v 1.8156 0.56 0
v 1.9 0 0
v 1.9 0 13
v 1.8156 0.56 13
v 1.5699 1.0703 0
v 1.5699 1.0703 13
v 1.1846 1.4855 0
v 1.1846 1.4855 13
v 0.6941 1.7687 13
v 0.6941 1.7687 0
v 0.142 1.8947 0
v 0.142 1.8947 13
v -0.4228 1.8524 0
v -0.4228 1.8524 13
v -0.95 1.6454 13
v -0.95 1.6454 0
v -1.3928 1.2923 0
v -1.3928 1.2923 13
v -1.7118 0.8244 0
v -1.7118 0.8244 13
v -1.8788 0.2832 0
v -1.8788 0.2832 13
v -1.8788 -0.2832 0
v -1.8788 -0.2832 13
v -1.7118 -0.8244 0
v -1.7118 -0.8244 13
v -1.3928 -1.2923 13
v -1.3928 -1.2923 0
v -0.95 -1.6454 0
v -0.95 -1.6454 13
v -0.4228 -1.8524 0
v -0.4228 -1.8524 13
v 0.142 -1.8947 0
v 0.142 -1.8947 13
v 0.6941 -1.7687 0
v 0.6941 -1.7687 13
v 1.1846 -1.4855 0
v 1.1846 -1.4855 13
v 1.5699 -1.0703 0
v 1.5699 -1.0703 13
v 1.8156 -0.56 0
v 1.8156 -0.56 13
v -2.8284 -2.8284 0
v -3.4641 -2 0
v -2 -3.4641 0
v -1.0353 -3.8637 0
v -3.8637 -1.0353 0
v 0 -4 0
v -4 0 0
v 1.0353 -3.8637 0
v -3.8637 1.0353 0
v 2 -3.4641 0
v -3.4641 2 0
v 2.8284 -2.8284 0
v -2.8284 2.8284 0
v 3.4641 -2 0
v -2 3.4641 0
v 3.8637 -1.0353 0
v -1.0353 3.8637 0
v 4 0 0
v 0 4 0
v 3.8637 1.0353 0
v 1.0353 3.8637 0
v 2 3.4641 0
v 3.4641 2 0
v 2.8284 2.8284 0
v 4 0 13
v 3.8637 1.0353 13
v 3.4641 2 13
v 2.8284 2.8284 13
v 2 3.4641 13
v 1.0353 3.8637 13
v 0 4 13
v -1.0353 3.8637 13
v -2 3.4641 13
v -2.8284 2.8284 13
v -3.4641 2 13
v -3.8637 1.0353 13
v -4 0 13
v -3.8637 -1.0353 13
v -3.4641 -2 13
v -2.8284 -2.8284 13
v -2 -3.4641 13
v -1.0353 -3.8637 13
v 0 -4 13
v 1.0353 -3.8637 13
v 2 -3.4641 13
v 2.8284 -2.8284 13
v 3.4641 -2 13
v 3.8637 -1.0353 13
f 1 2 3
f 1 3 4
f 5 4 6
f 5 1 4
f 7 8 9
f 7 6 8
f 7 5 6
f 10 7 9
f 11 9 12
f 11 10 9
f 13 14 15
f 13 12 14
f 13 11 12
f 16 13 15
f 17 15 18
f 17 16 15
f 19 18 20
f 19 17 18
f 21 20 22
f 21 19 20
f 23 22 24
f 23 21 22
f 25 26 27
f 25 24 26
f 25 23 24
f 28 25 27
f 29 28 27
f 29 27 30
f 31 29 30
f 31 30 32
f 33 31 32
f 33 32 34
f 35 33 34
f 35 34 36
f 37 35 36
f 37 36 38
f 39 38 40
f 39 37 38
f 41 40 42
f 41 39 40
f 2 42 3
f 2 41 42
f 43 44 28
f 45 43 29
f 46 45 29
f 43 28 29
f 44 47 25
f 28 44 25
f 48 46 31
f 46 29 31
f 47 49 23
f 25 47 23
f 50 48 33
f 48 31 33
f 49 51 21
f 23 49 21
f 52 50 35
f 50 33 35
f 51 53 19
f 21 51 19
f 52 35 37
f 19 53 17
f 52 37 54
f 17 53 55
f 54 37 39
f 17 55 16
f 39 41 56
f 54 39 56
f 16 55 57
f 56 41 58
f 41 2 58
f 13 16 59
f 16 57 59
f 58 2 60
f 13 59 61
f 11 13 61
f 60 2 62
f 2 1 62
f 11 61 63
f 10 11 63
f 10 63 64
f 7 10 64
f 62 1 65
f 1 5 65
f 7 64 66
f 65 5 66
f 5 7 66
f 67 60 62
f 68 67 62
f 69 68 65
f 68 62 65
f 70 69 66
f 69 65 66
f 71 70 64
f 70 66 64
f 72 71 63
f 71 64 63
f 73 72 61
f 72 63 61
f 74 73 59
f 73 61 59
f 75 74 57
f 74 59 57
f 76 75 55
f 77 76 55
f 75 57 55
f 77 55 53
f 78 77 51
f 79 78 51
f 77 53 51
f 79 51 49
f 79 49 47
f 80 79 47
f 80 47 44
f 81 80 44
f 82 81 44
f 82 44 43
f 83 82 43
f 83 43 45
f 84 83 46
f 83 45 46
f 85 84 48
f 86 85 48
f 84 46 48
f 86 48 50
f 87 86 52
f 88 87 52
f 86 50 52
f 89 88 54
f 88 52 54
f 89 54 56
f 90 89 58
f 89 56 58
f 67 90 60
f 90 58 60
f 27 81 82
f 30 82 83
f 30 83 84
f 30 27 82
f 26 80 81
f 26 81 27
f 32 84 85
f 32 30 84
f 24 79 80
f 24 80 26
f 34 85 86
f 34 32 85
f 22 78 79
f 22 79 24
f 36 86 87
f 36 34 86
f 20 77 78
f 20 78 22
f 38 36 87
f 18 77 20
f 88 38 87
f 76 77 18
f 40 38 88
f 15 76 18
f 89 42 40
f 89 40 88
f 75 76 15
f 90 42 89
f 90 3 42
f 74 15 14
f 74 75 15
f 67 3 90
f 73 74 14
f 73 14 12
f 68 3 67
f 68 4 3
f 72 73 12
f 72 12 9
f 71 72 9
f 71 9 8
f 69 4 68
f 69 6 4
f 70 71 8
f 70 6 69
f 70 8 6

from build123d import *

# Parameters (mm, degrees)
CYLINDER004_R     = 1.9
CYLINDER004_DEPTH = 20
CYLINDER005_R     = 4
CYLINDER005_DEPTH = 13


with BuildPart() as cylinder004:
    # Cylinder004 → Cylinder004 (new body)
    with BuildSketch(Plane.XY.offset(-1)):
        Circle(CYLINDER004_R)
    extrude(amount=CYLINDER004_DEPTH)


with BuildPart() as cut004:
    # Cylinder005 → Cylinder005 (new body)
    with BuildSketch(Plane.XY):
        Circle(CYLINDER005_R)
    extrude(amount=CYLINDER005_DEPTH)

    # Cut004: cut Cylinder004
    add(cylinder004.part, mode=Mode.SUBTRACT)


solid = cut004.part
